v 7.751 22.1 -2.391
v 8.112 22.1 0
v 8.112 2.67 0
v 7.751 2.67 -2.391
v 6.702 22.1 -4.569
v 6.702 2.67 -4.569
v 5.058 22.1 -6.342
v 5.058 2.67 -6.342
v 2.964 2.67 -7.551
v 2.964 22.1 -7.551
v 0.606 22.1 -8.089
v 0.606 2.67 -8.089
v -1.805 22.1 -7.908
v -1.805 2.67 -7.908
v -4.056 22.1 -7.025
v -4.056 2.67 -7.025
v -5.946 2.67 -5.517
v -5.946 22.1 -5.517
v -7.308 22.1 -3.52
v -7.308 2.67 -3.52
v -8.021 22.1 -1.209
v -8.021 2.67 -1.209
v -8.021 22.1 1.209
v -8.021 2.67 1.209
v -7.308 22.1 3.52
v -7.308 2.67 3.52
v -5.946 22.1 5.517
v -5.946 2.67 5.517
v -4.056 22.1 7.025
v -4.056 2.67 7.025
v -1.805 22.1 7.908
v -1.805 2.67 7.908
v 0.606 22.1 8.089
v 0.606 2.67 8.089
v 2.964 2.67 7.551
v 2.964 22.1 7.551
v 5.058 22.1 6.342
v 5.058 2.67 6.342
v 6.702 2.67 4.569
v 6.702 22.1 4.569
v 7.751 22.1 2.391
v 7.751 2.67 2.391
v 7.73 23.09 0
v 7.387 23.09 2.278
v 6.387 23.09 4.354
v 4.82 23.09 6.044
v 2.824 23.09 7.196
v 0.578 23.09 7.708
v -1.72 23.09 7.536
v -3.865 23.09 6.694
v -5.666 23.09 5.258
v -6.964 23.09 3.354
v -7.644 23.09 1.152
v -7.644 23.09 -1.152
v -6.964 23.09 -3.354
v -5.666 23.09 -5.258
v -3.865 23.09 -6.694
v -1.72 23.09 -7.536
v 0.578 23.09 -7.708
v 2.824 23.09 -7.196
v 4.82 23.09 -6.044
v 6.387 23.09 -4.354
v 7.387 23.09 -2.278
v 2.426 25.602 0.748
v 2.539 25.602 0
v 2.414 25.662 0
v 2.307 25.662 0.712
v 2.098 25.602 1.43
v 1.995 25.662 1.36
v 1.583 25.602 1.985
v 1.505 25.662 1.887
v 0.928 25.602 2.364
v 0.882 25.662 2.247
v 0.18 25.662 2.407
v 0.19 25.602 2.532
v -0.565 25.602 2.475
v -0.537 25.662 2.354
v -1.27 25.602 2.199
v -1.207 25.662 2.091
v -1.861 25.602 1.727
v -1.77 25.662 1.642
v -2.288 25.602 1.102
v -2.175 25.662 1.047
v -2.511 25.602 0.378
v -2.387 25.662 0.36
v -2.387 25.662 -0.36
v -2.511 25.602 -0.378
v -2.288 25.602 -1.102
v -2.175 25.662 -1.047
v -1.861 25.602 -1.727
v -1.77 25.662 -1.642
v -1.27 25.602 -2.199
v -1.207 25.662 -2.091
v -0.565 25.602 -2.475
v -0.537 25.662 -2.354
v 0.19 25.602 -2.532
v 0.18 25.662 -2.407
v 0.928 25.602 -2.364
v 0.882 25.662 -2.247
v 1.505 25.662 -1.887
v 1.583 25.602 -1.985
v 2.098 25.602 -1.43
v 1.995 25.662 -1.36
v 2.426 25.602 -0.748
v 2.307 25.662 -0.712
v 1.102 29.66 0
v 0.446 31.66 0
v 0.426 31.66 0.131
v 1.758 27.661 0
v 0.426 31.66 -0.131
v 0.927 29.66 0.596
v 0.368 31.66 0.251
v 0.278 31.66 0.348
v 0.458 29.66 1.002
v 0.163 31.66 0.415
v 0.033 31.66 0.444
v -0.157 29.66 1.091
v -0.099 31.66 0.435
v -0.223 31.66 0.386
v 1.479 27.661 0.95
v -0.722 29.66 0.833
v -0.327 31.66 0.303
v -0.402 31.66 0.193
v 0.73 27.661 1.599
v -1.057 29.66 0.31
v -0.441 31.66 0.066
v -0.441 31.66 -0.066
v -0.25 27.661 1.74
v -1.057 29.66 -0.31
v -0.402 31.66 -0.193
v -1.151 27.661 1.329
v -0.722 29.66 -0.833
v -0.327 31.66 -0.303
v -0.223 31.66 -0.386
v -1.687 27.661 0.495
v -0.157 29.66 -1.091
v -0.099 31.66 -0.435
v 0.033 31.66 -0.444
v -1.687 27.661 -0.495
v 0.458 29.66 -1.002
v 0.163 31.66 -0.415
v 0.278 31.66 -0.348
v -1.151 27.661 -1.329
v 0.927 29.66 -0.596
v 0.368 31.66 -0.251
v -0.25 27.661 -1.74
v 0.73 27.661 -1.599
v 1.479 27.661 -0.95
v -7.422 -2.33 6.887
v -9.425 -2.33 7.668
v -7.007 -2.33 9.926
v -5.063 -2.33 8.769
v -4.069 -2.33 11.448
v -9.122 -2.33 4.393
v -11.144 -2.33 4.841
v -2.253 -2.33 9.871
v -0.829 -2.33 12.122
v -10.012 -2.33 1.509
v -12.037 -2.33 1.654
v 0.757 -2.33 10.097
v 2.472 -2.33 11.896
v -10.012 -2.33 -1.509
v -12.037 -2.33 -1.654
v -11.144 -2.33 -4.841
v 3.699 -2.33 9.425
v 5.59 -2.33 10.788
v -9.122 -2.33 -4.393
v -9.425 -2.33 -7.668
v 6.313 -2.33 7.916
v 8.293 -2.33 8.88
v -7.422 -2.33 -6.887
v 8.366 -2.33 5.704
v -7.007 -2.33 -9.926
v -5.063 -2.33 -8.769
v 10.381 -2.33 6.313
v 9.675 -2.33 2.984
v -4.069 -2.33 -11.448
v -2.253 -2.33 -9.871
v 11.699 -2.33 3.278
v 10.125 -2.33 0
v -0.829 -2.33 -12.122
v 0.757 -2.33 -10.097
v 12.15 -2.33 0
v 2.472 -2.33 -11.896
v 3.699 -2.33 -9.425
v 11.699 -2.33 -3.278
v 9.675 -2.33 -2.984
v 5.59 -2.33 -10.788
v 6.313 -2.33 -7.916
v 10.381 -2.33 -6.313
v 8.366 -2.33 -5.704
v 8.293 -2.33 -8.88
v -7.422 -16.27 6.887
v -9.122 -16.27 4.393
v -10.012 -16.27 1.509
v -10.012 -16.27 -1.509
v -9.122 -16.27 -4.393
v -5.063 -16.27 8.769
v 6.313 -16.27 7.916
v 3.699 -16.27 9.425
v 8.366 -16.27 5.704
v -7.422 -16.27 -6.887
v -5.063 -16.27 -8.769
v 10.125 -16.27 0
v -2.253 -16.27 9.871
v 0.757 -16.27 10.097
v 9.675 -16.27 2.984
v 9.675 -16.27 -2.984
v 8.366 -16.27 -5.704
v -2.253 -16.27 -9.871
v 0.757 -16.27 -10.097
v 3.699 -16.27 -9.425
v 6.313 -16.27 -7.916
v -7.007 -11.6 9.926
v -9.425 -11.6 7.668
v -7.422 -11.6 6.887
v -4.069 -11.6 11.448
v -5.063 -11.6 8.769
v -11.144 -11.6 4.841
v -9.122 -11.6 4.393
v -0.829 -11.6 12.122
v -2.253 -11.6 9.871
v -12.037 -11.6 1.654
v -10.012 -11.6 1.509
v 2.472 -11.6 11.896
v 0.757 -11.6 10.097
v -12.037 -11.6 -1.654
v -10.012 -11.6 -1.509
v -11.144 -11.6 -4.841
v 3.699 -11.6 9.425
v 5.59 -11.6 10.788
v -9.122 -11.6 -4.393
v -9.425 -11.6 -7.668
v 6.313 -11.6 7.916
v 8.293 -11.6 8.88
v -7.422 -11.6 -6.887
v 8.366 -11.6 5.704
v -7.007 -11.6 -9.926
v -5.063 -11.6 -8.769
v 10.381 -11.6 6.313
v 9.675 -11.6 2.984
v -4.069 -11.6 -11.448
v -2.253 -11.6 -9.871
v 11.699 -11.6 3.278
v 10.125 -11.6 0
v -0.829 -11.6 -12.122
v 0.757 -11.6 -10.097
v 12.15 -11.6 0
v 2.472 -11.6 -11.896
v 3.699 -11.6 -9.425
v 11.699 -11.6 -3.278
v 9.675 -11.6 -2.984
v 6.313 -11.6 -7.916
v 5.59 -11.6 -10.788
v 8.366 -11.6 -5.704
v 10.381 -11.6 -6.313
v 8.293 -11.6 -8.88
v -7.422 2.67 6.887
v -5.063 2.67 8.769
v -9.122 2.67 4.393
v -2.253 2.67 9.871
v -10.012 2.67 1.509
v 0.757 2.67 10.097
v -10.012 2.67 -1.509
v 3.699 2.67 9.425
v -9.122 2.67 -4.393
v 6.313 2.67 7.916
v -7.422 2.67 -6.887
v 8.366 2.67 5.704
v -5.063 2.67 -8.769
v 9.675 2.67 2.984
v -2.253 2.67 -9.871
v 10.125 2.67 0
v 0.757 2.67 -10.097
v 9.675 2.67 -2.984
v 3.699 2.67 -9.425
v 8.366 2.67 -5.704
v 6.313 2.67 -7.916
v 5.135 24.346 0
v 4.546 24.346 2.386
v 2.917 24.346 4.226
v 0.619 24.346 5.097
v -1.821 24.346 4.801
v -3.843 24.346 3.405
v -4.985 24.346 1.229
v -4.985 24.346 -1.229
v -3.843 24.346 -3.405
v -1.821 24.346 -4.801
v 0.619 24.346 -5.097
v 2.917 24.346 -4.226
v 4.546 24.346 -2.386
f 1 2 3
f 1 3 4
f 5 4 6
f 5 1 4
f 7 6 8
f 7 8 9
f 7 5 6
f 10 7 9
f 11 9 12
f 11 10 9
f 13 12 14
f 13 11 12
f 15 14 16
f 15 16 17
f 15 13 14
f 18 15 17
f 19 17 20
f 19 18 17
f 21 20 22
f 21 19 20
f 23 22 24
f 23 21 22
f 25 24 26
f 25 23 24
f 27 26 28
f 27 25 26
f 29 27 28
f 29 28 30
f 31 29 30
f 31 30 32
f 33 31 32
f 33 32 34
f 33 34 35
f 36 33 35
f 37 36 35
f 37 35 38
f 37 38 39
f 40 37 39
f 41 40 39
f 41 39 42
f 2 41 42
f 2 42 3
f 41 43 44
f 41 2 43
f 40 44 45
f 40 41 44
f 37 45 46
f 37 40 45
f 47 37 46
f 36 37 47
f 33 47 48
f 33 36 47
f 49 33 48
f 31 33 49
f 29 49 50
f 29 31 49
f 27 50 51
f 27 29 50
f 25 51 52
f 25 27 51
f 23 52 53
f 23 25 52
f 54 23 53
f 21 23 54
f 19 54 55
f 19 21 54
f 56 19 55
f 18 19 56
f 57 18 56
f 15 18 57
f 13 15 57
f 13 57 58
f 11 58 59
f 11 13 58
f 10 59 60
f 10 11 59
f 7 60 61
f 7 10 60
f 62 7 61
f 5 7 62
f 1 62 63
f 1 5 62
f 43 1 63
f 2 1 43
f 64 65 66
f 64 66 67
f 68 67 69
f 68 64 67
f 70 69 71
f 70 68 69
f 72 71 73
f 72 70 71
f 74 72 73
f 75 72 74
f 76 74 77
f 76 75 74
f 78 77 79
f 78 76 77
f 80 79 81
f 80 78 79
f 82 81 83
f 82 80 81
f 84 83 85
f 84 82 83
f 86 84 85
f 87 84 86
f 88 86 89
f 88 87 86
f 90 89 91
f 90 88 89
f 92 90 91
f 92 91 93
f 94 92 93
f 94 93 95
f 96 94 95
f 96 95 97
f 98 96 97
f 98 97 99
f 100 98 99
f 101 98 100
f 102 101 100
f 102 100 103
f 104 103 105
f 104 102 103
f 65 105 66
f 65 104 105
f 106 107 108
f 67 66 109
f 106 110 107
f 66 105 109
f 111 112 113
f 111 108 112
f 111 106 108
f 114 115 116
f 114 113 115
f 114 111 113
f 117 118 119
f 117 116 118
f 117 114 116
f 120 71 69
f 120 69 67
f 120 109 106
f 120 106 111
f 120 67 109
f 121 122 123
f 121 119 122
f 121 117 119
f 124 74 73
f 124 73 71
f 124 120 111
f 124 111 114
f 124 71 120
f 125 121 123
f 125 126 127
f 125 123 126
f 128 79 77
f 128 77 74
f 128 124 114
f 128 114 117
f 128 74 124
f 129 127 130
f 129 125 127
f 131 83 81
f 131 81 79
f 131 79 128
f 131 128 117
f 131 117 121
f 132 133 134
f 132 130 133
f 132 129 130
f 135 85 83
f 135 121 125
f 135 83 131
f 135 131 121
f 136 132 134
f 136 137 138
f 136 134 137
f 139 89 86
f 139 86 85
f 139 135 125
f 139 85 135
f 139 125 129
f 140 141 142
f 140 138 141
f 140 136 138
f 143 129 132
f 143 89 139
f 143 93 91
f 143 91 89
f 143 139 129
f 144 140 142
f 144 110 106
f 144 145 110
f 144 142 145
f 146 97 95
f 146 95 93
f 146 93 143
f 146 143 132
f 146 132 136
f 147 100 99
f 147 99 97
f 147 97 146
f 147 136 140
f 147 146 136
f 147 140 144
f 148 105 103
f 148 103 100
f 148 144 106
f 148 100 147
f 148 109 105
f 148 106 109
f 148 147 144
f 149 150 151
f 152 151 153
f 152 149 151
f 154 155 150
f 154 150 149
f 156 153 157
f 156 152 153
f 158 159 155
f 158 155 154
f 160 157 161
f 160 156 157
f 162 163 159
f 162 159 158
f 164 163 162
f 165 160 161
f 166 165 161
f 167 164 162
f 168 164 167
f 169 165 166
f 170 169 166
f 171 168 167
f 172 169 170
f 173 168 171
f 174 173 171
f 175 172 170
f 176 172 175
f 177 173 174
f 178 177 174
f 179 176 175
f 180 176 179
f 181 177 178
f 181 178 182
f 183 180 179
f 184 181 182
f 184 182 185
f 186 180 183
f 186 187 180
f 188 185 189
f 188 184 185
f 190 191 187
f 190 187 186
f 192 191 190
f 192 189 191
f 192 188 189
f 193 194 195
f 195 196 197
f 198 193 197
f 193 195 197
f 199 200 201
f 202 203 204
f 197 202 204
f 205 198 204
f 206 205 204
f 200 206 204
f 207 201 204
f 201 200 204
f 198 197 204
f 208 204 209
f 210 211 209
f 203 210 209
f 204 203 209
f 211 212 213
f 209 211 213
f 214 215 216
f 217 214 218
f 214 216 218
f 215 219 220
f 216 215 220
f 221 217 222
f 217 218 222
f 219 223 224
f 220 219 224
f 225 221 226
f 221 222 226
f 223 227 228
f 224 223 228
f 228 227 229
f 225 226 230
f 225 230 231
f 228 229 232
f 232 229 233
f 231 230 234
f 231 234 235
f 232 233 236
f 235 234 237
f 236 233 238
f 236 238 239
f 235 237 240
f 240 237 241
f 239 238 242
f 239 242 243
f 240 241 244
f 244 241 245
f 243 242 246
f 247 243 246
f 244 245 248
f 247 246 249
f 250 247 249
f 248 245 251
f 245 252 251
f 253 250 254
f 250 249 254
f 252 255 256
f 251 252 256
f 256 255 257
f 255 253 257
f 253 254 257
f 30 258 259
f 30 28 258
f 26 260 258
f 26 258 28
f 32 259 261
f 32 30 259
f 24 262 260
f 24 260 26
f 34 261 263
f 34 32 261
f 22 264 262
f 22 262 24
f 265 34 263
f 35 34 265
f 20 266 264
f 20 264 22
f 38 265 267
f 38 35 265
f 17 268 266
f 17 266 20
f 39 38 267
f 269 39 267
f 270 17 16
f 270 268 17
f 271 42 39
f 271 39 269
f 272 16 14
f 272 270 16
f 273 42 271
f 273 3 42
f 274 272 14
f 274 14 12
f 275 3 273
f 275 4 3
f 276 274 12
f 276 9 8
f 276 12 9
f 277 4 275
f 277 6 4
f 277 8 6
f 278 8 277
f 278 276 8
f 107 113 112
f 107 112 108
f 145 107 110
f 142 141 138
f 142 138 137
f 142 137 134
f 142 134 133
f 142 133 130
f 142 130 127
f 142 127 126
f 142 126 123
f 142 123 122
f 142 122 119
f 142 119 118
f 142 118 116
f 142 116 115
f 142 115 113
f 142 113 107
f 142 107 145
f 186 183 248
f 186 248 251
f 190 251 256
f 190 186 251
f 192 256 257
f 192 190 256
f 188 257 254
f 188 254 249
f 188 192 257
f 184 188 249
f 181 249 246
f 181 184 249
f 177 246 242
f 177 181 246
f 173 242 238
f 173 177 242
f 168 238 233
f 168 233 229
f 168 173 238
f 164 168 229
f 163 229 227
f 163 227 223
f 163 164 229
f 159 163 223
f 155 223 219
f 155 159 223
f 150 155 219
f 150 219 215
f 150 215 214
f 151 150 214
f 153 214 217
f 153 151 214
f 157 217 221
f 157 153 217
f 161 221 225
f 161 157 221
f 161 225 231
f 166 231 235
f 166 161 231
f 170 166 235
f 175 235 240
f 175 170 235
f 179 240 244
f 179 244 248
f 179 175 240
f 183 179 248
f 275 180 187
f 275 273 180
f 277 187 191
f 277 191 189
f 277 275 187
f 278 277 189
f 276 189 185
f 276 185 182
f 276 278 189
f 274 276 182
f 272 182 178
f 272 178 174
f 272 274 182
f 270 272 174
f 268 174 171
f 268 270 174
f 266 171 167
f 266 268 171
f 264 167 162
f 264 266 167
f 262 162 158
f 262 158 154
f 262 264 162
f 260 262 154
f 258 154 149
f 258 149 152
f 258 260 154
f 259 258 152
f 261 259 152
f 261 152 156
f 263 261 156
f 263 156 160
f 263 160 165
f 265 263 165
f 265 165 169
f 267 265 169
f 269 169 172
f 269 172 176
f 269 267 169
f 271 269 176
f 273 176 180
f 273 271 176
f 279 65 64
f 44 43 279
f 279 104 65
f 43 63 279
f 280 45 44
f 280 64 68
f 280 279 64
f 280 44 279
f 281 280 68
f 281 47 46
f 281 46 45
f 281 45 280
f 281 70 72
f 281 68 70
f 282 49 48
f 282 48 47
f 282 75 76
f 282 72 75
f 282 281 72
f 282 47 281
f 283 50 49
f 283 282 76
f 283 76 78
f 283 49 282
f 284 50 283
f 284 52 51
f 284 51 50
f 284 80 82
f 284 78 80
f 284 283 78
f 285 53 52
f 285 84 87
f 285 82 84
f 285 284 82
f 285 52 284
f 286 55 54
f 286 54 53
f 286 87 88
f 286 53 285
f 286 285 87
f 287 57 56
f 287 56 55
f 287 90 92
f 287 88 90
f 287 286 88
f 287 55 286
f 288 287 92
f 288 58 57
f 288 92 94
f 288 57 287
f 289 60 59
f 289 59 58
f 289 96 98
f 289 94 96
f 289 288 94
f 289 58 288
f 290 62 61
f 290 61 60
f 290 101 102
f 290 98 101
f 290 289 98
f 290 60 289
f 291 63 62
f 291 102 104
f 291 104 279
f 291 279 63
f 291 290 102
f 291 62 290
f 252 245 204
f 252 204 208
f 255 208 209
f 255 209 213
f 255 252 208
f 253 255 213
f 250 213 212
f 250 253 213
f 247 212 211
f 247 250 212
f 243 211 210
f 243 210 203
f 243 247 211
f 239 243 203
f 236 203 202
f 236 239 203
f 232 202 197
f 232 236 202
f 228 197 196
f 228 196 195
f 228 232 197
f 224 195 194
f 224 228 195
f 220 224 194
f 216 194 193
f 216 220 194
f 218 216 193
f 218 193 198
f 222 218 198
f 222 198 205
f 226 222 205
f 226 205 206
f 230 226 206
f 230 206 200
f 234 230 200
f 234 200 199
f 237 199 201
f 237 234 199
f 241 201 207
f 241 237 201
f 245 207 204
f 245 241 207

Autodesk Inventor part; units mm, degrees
ref_plane "YZ Plane" through (0, 0, 0) normal (1, 0, 0) x (0, 1, 0)
ref_plane "XZ Plane" through (0, 0, 0) normal (0, 1, 0) x (-1, 0, 0)
ref_plane "XY Plane" through (0, 0, 0) normal (0, 0, 1) x (1, 0, 0)
sketch "Sketch1" plane through (0, 0, 0) normal (0, 0, 1) x (1, 0, 0)
  line L0 (0, -16.2697) -> (0, 26.8303)
  line L1 (0, -16.2697) -> (10.125, -16.2697)
  line L2 (10.125, -16.2697) -> (10.125, -11.5997)
  line L3 (10.125, -11.5997) -> (12.15, -11.5997)
  line L4 (12.15, -11.5997) -> (12.15, -2.3297)
  line L5 (12.15, -2.3297) -> (10.125, -2.3297)
  line L6 (8.1117, 22.1005) -> (7.73, 23.0903)
  line L7 (7.73, 23.0903) -> (2.4142, 25.6622)
  line L8 (2.5391, 25.6018) -> (2.4142, 25.6622)
  line L9 (0, 31.6595) -> (0, 26.8303)
  line L10 (0, 31.6595) -> (0.4457, 31.6595)
  line L11 (0.4457, 31.6595) -> (2.4142, 25.6622)
  line L12 (10.125, -2.3297) -> (10.125, 2.6703)
  line L13 (10.125, 2.6703) -> (8.1117, 2.6703)
  line L14 (8.1117, 2.6703) -> (8.1117, 22.1005)
  point P0 (0, 0)
  point P1 (10.125, 16.8803)
  dimension "d0" = 43.1
  dimension "d1" = 10.125
  dimension "d2" = 4.67
  dimension "d3" = 2.025
  dimension "d4" = 90
  dimension "d5" = 9.27
  dimension "d8" = 39.36
  dimension "d10" = 5
revolve "Revolution1" add sketch "Sketch1" angle 360 about axis through (0, -16.2697, 0) along (0, 1, 0)
properties part number "00_objectivelens_10x"
